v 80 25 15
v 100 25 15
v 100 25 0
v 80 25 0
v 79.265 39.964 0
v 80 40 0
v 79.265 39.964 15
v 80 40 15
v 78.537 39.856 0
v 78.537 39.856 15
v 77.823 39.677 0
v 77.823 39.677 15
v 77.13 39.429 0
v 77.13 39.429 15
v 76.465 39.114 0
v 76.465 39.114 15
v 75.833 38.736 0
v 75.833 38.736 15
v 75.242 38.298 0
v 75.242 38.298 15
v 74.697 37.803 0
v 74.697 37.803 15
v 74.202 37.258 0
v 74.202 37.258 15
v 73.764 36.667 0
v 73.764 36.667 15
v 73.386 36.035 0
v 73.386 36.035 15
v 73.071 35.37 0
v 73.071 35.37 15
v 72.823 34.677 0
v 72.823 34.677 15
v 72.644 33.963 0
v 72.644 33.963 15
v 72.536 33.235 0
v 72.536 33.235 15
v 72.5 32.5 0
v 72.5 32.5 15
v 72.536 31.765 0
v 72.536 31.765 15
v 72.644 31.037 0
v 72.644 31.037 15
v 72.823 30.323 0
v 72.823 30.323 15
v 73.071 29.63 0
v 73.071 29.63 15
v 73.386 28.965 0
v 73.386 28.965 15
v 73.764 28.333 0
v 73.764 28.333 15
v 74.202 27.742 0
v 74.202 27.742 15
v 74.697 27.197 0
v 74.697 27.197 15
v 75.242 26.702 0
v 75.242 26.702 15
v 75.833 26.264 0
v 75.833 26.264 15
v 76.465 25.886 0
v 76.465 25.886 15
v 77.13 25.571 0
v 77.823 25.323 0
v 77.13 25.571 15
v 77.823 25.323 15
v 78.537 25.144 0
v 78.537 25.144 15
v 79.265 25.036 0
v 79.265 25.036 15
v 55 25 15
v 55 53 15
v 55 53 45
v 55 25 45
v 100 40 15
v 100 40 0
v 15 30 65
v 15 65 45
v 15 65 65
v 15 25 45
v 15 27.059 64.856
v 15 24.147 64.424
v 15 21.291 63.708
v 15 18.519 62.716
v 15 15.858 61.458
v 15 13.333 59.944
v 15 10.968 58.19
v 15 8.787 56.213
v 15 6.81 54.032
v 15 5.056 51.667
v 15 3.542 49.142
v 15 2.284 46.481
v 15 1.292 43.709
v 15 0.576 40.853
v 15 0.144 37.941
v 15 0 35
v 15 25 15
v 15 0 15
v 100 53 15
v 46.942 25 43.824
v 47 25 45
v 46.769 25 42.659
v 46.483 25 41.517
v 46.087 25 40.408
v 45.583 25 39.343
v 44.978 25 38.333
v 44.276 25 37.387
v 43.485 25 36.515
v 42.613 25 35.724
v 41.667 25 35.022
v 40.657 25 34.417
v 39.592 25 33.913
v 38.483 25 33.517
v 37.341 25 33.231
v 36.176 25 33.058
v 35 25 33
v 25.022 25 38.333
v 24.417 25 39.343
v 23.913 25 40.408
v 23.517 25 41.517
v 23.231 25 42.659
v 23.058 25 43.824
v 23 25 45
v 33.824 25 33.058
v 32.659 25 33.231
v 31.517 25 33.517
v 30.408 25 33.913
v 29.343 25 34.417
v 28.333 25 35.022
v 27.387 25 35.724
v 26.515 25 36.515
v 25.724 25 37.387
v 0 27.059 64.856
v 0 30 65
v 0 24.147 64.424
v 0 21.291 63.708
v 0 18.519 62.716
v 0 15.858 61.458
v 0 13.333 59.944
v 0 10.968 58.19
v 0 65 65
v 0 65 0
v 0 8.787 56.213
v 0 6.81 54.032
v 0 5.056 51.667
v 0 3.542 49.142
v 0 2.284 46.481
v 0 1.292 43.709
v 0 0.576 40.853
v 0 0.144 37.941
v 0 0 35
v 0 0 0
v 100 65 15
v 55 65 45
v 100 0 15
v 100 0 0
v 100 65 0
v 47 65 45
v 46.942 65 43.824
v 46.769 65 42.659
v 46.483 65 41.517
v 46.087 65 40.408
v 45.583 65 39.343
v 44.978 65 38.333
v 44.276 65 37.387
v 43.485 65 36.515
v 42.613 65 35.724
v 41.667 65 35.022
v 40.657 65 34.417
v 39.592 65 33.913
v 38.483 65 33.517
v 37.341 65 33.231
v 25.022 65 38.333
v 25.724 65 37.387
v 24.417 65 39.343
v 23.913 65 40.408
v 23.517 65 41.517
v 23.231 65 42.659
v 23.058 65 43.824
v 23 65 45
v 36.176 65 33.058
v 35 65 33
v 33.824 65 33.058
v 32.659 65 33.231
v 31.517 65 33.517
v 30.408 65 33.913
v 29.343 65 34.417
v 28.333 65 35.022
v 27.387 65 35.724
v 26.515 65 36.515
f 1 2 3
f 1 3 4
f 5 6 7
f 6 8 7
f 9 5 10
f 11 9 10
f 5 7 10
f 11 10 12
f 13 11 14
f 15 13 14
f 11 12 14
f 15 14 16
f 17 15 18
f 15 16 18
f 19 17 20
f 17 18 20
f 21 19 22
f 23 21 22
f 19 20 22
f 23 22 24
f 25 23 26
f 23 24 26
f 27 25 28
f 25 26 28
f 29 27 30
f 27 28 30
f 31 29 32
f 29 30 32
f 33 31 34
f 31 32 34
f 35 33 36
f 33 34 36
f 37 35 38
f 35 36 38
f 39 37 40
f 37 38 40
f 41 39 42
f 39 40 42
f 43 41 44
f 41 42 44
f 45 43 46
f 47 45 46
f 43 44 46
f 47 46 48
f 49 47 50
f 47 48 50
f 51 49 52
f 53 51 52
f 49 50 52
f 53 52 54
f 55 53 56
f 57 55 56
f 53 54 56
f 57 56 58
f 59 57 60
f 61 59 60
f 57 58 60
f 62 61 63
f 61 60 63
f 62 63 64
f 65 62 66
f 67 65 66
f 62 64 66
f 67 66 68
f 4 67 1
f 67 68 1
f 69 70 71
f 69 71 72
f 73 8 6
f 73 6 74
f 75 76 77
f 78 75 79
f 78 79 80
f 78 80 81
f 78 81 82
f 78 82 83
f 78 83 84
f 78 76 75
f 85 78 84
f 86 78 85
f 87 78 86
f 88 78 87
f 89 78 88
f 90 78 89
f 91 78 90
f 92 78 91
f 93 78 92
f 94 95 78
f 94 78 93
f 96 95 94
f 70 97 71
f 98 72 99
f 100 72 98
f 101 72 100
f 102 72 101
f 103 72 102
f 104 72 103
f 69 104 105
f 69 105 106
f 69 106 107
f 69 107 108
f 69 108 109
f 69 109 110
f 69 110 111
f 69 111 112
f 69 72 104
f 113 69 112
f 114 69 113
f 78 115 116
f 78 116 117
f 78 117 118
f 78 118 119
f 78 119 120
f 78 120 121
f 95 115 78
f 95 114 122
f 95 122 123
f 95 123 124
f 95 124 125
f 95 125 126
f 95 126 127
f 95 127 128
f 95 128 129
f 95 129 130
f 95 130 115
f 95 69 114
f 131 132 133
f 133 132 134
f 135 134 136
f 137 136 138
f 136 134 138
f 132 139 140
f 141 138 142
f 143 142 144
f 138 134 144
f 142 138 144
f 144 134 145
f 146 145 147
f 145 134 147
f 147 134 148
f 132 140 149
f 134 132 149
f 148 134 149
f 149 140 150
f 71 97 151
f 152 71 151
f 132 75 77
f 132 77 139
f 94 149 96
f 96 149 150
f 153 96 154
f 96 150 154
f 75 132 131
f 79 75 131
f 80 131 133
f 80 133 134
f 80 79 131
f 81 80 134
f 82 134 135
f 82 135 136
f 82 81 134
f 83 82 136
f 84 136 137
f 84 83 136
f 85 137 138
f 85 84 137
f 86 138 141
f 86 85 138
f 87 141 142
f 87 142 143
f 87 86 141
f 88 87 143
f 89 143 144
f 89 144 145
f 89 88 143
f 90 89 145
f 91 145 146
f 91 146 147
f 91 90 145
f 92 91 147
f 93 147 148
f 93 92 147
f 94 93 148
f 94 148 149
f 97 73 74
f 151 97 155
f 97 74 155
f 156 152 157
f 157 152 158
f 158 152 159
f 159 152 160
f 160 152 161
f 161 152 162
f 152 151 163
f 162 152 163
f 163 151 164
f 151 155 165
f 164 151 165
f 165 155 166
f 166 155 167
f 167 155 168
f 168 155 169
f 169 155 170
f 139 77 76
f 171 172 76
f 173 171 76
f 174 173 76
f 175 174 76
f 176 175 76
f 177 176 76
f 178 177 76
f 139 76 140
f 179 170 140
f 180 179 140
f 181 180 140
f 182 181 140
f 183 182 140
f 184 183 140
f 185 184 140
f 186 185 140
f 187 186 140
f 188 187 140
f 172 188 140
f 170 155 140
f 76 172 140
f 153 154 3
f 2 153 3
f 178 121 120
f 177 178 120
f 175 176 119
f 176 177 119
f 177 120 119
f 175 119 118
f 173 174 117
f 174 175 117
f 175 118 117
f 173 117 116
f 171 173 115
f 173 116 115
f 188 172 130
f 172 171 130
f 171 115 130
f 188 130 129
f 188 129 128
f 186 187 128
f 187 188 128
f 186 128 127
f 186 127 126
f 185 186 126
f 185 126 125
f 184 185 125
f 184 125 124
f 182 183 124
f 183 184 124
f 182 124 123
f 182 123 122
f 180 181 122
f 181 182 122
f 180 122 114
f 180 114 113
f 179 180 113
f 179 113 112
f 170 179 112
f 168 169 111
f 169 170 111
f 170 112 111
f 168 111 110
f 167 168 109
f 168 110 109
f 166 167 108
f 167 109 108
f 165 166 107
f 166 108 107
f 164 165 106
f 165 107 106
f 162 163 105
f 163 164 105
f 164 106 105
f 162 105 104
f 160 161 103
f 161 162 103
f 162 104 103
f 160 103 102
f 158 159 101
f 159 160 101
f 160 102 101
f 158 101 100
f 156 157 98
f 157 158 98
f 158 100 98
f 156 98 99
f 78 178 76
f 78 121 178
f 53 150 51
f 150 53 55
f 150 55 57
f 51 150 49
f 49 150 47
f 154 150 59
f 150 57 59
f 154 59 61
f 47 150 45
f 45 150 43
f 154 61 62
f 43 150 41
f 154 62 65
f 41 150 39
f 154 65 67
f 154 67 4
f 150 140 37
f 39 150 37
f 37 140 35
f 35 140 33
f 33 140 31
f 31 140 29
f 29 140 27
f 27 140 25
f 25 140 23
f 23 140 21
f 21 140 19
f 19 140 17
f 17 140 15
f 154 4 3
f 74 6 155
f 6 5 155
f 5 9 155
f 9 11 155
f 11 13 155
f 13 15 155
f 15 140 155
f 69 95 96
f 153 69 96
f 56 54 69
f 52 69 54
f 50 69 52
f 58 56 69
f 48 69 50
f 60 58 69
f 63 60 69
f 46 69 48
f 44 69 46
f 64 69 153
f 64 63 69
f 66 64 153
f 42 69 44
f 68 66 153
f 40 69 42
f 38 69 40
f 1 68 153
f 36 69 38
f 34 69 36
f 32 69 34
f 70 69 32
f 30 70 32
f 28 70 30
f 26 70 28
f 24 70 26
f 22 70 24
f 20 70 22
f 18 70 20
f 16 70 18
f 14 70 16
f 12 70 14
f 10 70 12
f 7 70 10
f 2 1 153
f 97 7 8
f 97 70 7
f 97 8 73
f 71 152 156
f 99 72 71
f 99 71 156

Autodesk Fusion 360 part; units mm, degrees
sketch "Sketch1" plane through (0, 0, 0) normal (0, 0, 1) x (1, 0, 0)
  line L0 (0, 0) -> (100, 0)
  line L1 (100, 0) -> (100, 65)
  line L2 (100, 65) -> (0, 65)
  line L3 (0, 65) -> (0, 0)
  dimension "d1" = 100
  dimension "d2" = 65
extrude "Extrude1" add sketch "Sketch1" along normal blind 15
sketch "Sketch2" plane through (0, 0, 15) normal (0, 0, 1) x (-1, 0, 0)
  line L0 (0, -65) -> (0, 0)
  line L1 (0, 0) -> (-100, 0)
  line L2 (-100, 0) -> (-100, -65)
  line L3 (-100, -65) -> (0, -65)
  line L4 (0, -65) -> (-15, -65)
  line L5 (-15, -65) -> (-15, 0)
  line L6 (-15, 0) -> (0, 0)
  line L7 (0, 0) -> (0, -65)
  line L8 (-15, -65) -> (-55, -65)
  line L9 (-55, -65) -> (-55, -25)
  line L10 (-55, -25) -> (-15, -25)
  line L11 (-15, -25) -> (-15, -65)
  line L12 (-55, -65) -> (-100, -65)
  line L13 (-100, -65) -> (-100, -53)
  line L14 (-100, -53) -> (-55, -53)
  line L15 (-55, -53) -> (-55, -65)
  line L16 (-80, -40) -> (-100, -40)
  line L17 (-100, -40) -> (-100, -25)
  line L18 (-100, -25) -> (-80, -25)
  arc A0 (-80, -40) -> (-80.003, -25) centre (-80, -32.5) ccw
  dimension "d5" = 15
  dimension "d6" = 65
  dimension "d7" = 40
  dimension "d8" = 40
  dimension "d9" = 45
  dimension "d10" = 12
  dimension "d11" = 15
  dimension "d12" = 20
  dimension "d13" = 20
  dimension "d14" = 15
extrude "Extrude2" add sketch "Sketch2" along normal blind 50 contours L0 L1 L3 L4 L5 L6 L7 L11
extrude "Extrude3" add sketch "Sketch2" along normal blind 30 contours L3 L5 L8 L9 L10 L11 L15 | L2 L3 L9 L12 L13 L14 L15
extrude "Extrude4" cut sketch "Sketch2" against normal blind 30 contours L2 L16 L17 L18 A0
sketch "Sketch3" plane through (0, 53, 0) normal (0, -1, 0) x (1, 0, 0)
  line L0 (55, 15) -> (100, 15)
  line L1 (100, 15) -> (100, 45)
  line L2 (100, 45) -> (55, 45)
  line L3 (55, 45) -> (55, 15)
  line L4 (55, 45) -> (100, 15)
  line L5 (100, 45) -> (55, 45)
  line L6 (100, 45) -> (100, 15)
fillet "Fillet1" radius 30 1 edges at (7.5, 0, 65)
sketch "Sketch5" plane through (0, 25, 0) normal (0, -1, 0) x (1, 0, 0)
  line L0 (15, 15) -> (55, 15)
  line L1 (55, 15) -> (55, 45)
  line L2 (55, 45) -> (15, 45)
  line L3 (15, 45) -> (15, 15)
  line L4 (15, 45) -> (23, 45)
  line L5 (55, 45) -> (47, 45)
  line L6 (23, 45) -> (35, 45)
  circle A0 centre (35, 45) radius 12
  dimension "d25" = 8
  dimension "d26" = 8
  dimension "d27" = 12
  dimension "d28" = 24
chamfer "Chamfer1" distance 45 distance2 30 1 edges at (100, 59, 45) measured on face at (28.3333, 47.6667, 45)
sketch "Sketch6" plane through (0, 0, 45) normal (0, 0, 1) x (-1, 0, 0)
  line L0 (-55, -53) -> (-55, -65)
  line L1 (-55, -65) -> (-15, -65)
  line L2 (-15, -65) -> (-15, -25)
  line L3 (-15, -25) -> (-55, -25)
  line L4 (-55, -25) -> (-55, -53)
  line L5 (-35, -65) -> (-47, -65)
  line L6 (-47, -65) -> (-47, -25)
  line L7 (-47, -25) -> (-35, -25)
  line L8 (-35, -25) -> (-35, -65)
  dimension "d33" = 12
  dimension "d34" = 40
revolve "Revolve1" cut sketch "Sketch6" angle 360 about axis through (35, 25, 45) along (0, 1, 0) contours L1 L3 L5 L6 L7 L8
